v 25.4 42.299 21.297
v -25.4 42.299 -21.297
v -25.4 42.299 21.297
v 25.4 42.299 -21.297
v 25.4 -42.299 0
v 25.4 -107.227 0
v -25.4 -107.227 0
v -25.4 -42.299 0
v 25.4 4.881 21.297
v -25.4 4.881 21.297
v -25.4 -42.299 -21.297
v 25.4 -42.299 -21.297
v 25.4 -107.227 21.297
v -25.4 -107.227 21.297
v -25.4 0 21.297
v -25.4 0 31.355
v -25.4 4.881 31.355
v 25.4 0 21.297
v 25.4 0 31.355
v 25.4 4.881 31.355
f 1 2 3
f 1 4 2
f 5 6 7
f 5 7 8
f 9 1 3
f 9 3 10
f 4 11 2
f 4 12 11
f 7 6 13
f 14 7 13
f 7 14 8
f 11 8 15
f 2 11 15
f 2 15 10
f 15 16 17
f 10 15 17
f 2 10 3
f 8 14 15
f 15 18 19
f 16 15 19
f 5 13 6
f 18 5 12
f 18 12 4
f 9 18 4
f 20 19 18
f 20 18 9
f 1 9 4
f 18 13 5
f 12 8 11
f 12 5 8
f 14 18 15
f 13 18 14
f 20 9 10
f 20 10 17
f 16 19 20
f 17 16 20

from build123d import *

# Parameters (mm, degrees)
F0_W     = 64.9276450276
F0_H     = 21.2974622846
F0_W_2   = 4.8806965351
F0_H_2   = 10.0571289659
F1_DEPTH = 25.4
F2_DEPTH = 25.4


with BuildPart() as f1:
    # F0 (on Right) → F1 (new body)
    with BuildSketch(Plane.YZ):
        Polygon((42.2991216183, -21.2974622846), (42.2991216183, 21.2974622846), (4.8806965351, 21.2974622846), (0, 21.2974622846), (-42.2991216183, 21.2974622846), (-42.2991216183, 0), (-42.2991216183, -21.2974622846), align=None)
        with Locations((-74.7629441321, 10.6487311423)):
            Rectangle(F0_W, F0_H)
        with Locations((2.4403482676, 26.3260267675)):
            Rectangle(F0_W_2, F0_H_2)
    extrude(amount=F1_DEPTH)

    # F2 (add): a face of the model
    f2_faces = [f1.faces().sort_by_distance(p)[0] for p in [
        (0, -20.5074649501, 3.1809669358),
    ]]
    extrude(f2_faces, amount=F2_DEPTH)


solid = f1.part
